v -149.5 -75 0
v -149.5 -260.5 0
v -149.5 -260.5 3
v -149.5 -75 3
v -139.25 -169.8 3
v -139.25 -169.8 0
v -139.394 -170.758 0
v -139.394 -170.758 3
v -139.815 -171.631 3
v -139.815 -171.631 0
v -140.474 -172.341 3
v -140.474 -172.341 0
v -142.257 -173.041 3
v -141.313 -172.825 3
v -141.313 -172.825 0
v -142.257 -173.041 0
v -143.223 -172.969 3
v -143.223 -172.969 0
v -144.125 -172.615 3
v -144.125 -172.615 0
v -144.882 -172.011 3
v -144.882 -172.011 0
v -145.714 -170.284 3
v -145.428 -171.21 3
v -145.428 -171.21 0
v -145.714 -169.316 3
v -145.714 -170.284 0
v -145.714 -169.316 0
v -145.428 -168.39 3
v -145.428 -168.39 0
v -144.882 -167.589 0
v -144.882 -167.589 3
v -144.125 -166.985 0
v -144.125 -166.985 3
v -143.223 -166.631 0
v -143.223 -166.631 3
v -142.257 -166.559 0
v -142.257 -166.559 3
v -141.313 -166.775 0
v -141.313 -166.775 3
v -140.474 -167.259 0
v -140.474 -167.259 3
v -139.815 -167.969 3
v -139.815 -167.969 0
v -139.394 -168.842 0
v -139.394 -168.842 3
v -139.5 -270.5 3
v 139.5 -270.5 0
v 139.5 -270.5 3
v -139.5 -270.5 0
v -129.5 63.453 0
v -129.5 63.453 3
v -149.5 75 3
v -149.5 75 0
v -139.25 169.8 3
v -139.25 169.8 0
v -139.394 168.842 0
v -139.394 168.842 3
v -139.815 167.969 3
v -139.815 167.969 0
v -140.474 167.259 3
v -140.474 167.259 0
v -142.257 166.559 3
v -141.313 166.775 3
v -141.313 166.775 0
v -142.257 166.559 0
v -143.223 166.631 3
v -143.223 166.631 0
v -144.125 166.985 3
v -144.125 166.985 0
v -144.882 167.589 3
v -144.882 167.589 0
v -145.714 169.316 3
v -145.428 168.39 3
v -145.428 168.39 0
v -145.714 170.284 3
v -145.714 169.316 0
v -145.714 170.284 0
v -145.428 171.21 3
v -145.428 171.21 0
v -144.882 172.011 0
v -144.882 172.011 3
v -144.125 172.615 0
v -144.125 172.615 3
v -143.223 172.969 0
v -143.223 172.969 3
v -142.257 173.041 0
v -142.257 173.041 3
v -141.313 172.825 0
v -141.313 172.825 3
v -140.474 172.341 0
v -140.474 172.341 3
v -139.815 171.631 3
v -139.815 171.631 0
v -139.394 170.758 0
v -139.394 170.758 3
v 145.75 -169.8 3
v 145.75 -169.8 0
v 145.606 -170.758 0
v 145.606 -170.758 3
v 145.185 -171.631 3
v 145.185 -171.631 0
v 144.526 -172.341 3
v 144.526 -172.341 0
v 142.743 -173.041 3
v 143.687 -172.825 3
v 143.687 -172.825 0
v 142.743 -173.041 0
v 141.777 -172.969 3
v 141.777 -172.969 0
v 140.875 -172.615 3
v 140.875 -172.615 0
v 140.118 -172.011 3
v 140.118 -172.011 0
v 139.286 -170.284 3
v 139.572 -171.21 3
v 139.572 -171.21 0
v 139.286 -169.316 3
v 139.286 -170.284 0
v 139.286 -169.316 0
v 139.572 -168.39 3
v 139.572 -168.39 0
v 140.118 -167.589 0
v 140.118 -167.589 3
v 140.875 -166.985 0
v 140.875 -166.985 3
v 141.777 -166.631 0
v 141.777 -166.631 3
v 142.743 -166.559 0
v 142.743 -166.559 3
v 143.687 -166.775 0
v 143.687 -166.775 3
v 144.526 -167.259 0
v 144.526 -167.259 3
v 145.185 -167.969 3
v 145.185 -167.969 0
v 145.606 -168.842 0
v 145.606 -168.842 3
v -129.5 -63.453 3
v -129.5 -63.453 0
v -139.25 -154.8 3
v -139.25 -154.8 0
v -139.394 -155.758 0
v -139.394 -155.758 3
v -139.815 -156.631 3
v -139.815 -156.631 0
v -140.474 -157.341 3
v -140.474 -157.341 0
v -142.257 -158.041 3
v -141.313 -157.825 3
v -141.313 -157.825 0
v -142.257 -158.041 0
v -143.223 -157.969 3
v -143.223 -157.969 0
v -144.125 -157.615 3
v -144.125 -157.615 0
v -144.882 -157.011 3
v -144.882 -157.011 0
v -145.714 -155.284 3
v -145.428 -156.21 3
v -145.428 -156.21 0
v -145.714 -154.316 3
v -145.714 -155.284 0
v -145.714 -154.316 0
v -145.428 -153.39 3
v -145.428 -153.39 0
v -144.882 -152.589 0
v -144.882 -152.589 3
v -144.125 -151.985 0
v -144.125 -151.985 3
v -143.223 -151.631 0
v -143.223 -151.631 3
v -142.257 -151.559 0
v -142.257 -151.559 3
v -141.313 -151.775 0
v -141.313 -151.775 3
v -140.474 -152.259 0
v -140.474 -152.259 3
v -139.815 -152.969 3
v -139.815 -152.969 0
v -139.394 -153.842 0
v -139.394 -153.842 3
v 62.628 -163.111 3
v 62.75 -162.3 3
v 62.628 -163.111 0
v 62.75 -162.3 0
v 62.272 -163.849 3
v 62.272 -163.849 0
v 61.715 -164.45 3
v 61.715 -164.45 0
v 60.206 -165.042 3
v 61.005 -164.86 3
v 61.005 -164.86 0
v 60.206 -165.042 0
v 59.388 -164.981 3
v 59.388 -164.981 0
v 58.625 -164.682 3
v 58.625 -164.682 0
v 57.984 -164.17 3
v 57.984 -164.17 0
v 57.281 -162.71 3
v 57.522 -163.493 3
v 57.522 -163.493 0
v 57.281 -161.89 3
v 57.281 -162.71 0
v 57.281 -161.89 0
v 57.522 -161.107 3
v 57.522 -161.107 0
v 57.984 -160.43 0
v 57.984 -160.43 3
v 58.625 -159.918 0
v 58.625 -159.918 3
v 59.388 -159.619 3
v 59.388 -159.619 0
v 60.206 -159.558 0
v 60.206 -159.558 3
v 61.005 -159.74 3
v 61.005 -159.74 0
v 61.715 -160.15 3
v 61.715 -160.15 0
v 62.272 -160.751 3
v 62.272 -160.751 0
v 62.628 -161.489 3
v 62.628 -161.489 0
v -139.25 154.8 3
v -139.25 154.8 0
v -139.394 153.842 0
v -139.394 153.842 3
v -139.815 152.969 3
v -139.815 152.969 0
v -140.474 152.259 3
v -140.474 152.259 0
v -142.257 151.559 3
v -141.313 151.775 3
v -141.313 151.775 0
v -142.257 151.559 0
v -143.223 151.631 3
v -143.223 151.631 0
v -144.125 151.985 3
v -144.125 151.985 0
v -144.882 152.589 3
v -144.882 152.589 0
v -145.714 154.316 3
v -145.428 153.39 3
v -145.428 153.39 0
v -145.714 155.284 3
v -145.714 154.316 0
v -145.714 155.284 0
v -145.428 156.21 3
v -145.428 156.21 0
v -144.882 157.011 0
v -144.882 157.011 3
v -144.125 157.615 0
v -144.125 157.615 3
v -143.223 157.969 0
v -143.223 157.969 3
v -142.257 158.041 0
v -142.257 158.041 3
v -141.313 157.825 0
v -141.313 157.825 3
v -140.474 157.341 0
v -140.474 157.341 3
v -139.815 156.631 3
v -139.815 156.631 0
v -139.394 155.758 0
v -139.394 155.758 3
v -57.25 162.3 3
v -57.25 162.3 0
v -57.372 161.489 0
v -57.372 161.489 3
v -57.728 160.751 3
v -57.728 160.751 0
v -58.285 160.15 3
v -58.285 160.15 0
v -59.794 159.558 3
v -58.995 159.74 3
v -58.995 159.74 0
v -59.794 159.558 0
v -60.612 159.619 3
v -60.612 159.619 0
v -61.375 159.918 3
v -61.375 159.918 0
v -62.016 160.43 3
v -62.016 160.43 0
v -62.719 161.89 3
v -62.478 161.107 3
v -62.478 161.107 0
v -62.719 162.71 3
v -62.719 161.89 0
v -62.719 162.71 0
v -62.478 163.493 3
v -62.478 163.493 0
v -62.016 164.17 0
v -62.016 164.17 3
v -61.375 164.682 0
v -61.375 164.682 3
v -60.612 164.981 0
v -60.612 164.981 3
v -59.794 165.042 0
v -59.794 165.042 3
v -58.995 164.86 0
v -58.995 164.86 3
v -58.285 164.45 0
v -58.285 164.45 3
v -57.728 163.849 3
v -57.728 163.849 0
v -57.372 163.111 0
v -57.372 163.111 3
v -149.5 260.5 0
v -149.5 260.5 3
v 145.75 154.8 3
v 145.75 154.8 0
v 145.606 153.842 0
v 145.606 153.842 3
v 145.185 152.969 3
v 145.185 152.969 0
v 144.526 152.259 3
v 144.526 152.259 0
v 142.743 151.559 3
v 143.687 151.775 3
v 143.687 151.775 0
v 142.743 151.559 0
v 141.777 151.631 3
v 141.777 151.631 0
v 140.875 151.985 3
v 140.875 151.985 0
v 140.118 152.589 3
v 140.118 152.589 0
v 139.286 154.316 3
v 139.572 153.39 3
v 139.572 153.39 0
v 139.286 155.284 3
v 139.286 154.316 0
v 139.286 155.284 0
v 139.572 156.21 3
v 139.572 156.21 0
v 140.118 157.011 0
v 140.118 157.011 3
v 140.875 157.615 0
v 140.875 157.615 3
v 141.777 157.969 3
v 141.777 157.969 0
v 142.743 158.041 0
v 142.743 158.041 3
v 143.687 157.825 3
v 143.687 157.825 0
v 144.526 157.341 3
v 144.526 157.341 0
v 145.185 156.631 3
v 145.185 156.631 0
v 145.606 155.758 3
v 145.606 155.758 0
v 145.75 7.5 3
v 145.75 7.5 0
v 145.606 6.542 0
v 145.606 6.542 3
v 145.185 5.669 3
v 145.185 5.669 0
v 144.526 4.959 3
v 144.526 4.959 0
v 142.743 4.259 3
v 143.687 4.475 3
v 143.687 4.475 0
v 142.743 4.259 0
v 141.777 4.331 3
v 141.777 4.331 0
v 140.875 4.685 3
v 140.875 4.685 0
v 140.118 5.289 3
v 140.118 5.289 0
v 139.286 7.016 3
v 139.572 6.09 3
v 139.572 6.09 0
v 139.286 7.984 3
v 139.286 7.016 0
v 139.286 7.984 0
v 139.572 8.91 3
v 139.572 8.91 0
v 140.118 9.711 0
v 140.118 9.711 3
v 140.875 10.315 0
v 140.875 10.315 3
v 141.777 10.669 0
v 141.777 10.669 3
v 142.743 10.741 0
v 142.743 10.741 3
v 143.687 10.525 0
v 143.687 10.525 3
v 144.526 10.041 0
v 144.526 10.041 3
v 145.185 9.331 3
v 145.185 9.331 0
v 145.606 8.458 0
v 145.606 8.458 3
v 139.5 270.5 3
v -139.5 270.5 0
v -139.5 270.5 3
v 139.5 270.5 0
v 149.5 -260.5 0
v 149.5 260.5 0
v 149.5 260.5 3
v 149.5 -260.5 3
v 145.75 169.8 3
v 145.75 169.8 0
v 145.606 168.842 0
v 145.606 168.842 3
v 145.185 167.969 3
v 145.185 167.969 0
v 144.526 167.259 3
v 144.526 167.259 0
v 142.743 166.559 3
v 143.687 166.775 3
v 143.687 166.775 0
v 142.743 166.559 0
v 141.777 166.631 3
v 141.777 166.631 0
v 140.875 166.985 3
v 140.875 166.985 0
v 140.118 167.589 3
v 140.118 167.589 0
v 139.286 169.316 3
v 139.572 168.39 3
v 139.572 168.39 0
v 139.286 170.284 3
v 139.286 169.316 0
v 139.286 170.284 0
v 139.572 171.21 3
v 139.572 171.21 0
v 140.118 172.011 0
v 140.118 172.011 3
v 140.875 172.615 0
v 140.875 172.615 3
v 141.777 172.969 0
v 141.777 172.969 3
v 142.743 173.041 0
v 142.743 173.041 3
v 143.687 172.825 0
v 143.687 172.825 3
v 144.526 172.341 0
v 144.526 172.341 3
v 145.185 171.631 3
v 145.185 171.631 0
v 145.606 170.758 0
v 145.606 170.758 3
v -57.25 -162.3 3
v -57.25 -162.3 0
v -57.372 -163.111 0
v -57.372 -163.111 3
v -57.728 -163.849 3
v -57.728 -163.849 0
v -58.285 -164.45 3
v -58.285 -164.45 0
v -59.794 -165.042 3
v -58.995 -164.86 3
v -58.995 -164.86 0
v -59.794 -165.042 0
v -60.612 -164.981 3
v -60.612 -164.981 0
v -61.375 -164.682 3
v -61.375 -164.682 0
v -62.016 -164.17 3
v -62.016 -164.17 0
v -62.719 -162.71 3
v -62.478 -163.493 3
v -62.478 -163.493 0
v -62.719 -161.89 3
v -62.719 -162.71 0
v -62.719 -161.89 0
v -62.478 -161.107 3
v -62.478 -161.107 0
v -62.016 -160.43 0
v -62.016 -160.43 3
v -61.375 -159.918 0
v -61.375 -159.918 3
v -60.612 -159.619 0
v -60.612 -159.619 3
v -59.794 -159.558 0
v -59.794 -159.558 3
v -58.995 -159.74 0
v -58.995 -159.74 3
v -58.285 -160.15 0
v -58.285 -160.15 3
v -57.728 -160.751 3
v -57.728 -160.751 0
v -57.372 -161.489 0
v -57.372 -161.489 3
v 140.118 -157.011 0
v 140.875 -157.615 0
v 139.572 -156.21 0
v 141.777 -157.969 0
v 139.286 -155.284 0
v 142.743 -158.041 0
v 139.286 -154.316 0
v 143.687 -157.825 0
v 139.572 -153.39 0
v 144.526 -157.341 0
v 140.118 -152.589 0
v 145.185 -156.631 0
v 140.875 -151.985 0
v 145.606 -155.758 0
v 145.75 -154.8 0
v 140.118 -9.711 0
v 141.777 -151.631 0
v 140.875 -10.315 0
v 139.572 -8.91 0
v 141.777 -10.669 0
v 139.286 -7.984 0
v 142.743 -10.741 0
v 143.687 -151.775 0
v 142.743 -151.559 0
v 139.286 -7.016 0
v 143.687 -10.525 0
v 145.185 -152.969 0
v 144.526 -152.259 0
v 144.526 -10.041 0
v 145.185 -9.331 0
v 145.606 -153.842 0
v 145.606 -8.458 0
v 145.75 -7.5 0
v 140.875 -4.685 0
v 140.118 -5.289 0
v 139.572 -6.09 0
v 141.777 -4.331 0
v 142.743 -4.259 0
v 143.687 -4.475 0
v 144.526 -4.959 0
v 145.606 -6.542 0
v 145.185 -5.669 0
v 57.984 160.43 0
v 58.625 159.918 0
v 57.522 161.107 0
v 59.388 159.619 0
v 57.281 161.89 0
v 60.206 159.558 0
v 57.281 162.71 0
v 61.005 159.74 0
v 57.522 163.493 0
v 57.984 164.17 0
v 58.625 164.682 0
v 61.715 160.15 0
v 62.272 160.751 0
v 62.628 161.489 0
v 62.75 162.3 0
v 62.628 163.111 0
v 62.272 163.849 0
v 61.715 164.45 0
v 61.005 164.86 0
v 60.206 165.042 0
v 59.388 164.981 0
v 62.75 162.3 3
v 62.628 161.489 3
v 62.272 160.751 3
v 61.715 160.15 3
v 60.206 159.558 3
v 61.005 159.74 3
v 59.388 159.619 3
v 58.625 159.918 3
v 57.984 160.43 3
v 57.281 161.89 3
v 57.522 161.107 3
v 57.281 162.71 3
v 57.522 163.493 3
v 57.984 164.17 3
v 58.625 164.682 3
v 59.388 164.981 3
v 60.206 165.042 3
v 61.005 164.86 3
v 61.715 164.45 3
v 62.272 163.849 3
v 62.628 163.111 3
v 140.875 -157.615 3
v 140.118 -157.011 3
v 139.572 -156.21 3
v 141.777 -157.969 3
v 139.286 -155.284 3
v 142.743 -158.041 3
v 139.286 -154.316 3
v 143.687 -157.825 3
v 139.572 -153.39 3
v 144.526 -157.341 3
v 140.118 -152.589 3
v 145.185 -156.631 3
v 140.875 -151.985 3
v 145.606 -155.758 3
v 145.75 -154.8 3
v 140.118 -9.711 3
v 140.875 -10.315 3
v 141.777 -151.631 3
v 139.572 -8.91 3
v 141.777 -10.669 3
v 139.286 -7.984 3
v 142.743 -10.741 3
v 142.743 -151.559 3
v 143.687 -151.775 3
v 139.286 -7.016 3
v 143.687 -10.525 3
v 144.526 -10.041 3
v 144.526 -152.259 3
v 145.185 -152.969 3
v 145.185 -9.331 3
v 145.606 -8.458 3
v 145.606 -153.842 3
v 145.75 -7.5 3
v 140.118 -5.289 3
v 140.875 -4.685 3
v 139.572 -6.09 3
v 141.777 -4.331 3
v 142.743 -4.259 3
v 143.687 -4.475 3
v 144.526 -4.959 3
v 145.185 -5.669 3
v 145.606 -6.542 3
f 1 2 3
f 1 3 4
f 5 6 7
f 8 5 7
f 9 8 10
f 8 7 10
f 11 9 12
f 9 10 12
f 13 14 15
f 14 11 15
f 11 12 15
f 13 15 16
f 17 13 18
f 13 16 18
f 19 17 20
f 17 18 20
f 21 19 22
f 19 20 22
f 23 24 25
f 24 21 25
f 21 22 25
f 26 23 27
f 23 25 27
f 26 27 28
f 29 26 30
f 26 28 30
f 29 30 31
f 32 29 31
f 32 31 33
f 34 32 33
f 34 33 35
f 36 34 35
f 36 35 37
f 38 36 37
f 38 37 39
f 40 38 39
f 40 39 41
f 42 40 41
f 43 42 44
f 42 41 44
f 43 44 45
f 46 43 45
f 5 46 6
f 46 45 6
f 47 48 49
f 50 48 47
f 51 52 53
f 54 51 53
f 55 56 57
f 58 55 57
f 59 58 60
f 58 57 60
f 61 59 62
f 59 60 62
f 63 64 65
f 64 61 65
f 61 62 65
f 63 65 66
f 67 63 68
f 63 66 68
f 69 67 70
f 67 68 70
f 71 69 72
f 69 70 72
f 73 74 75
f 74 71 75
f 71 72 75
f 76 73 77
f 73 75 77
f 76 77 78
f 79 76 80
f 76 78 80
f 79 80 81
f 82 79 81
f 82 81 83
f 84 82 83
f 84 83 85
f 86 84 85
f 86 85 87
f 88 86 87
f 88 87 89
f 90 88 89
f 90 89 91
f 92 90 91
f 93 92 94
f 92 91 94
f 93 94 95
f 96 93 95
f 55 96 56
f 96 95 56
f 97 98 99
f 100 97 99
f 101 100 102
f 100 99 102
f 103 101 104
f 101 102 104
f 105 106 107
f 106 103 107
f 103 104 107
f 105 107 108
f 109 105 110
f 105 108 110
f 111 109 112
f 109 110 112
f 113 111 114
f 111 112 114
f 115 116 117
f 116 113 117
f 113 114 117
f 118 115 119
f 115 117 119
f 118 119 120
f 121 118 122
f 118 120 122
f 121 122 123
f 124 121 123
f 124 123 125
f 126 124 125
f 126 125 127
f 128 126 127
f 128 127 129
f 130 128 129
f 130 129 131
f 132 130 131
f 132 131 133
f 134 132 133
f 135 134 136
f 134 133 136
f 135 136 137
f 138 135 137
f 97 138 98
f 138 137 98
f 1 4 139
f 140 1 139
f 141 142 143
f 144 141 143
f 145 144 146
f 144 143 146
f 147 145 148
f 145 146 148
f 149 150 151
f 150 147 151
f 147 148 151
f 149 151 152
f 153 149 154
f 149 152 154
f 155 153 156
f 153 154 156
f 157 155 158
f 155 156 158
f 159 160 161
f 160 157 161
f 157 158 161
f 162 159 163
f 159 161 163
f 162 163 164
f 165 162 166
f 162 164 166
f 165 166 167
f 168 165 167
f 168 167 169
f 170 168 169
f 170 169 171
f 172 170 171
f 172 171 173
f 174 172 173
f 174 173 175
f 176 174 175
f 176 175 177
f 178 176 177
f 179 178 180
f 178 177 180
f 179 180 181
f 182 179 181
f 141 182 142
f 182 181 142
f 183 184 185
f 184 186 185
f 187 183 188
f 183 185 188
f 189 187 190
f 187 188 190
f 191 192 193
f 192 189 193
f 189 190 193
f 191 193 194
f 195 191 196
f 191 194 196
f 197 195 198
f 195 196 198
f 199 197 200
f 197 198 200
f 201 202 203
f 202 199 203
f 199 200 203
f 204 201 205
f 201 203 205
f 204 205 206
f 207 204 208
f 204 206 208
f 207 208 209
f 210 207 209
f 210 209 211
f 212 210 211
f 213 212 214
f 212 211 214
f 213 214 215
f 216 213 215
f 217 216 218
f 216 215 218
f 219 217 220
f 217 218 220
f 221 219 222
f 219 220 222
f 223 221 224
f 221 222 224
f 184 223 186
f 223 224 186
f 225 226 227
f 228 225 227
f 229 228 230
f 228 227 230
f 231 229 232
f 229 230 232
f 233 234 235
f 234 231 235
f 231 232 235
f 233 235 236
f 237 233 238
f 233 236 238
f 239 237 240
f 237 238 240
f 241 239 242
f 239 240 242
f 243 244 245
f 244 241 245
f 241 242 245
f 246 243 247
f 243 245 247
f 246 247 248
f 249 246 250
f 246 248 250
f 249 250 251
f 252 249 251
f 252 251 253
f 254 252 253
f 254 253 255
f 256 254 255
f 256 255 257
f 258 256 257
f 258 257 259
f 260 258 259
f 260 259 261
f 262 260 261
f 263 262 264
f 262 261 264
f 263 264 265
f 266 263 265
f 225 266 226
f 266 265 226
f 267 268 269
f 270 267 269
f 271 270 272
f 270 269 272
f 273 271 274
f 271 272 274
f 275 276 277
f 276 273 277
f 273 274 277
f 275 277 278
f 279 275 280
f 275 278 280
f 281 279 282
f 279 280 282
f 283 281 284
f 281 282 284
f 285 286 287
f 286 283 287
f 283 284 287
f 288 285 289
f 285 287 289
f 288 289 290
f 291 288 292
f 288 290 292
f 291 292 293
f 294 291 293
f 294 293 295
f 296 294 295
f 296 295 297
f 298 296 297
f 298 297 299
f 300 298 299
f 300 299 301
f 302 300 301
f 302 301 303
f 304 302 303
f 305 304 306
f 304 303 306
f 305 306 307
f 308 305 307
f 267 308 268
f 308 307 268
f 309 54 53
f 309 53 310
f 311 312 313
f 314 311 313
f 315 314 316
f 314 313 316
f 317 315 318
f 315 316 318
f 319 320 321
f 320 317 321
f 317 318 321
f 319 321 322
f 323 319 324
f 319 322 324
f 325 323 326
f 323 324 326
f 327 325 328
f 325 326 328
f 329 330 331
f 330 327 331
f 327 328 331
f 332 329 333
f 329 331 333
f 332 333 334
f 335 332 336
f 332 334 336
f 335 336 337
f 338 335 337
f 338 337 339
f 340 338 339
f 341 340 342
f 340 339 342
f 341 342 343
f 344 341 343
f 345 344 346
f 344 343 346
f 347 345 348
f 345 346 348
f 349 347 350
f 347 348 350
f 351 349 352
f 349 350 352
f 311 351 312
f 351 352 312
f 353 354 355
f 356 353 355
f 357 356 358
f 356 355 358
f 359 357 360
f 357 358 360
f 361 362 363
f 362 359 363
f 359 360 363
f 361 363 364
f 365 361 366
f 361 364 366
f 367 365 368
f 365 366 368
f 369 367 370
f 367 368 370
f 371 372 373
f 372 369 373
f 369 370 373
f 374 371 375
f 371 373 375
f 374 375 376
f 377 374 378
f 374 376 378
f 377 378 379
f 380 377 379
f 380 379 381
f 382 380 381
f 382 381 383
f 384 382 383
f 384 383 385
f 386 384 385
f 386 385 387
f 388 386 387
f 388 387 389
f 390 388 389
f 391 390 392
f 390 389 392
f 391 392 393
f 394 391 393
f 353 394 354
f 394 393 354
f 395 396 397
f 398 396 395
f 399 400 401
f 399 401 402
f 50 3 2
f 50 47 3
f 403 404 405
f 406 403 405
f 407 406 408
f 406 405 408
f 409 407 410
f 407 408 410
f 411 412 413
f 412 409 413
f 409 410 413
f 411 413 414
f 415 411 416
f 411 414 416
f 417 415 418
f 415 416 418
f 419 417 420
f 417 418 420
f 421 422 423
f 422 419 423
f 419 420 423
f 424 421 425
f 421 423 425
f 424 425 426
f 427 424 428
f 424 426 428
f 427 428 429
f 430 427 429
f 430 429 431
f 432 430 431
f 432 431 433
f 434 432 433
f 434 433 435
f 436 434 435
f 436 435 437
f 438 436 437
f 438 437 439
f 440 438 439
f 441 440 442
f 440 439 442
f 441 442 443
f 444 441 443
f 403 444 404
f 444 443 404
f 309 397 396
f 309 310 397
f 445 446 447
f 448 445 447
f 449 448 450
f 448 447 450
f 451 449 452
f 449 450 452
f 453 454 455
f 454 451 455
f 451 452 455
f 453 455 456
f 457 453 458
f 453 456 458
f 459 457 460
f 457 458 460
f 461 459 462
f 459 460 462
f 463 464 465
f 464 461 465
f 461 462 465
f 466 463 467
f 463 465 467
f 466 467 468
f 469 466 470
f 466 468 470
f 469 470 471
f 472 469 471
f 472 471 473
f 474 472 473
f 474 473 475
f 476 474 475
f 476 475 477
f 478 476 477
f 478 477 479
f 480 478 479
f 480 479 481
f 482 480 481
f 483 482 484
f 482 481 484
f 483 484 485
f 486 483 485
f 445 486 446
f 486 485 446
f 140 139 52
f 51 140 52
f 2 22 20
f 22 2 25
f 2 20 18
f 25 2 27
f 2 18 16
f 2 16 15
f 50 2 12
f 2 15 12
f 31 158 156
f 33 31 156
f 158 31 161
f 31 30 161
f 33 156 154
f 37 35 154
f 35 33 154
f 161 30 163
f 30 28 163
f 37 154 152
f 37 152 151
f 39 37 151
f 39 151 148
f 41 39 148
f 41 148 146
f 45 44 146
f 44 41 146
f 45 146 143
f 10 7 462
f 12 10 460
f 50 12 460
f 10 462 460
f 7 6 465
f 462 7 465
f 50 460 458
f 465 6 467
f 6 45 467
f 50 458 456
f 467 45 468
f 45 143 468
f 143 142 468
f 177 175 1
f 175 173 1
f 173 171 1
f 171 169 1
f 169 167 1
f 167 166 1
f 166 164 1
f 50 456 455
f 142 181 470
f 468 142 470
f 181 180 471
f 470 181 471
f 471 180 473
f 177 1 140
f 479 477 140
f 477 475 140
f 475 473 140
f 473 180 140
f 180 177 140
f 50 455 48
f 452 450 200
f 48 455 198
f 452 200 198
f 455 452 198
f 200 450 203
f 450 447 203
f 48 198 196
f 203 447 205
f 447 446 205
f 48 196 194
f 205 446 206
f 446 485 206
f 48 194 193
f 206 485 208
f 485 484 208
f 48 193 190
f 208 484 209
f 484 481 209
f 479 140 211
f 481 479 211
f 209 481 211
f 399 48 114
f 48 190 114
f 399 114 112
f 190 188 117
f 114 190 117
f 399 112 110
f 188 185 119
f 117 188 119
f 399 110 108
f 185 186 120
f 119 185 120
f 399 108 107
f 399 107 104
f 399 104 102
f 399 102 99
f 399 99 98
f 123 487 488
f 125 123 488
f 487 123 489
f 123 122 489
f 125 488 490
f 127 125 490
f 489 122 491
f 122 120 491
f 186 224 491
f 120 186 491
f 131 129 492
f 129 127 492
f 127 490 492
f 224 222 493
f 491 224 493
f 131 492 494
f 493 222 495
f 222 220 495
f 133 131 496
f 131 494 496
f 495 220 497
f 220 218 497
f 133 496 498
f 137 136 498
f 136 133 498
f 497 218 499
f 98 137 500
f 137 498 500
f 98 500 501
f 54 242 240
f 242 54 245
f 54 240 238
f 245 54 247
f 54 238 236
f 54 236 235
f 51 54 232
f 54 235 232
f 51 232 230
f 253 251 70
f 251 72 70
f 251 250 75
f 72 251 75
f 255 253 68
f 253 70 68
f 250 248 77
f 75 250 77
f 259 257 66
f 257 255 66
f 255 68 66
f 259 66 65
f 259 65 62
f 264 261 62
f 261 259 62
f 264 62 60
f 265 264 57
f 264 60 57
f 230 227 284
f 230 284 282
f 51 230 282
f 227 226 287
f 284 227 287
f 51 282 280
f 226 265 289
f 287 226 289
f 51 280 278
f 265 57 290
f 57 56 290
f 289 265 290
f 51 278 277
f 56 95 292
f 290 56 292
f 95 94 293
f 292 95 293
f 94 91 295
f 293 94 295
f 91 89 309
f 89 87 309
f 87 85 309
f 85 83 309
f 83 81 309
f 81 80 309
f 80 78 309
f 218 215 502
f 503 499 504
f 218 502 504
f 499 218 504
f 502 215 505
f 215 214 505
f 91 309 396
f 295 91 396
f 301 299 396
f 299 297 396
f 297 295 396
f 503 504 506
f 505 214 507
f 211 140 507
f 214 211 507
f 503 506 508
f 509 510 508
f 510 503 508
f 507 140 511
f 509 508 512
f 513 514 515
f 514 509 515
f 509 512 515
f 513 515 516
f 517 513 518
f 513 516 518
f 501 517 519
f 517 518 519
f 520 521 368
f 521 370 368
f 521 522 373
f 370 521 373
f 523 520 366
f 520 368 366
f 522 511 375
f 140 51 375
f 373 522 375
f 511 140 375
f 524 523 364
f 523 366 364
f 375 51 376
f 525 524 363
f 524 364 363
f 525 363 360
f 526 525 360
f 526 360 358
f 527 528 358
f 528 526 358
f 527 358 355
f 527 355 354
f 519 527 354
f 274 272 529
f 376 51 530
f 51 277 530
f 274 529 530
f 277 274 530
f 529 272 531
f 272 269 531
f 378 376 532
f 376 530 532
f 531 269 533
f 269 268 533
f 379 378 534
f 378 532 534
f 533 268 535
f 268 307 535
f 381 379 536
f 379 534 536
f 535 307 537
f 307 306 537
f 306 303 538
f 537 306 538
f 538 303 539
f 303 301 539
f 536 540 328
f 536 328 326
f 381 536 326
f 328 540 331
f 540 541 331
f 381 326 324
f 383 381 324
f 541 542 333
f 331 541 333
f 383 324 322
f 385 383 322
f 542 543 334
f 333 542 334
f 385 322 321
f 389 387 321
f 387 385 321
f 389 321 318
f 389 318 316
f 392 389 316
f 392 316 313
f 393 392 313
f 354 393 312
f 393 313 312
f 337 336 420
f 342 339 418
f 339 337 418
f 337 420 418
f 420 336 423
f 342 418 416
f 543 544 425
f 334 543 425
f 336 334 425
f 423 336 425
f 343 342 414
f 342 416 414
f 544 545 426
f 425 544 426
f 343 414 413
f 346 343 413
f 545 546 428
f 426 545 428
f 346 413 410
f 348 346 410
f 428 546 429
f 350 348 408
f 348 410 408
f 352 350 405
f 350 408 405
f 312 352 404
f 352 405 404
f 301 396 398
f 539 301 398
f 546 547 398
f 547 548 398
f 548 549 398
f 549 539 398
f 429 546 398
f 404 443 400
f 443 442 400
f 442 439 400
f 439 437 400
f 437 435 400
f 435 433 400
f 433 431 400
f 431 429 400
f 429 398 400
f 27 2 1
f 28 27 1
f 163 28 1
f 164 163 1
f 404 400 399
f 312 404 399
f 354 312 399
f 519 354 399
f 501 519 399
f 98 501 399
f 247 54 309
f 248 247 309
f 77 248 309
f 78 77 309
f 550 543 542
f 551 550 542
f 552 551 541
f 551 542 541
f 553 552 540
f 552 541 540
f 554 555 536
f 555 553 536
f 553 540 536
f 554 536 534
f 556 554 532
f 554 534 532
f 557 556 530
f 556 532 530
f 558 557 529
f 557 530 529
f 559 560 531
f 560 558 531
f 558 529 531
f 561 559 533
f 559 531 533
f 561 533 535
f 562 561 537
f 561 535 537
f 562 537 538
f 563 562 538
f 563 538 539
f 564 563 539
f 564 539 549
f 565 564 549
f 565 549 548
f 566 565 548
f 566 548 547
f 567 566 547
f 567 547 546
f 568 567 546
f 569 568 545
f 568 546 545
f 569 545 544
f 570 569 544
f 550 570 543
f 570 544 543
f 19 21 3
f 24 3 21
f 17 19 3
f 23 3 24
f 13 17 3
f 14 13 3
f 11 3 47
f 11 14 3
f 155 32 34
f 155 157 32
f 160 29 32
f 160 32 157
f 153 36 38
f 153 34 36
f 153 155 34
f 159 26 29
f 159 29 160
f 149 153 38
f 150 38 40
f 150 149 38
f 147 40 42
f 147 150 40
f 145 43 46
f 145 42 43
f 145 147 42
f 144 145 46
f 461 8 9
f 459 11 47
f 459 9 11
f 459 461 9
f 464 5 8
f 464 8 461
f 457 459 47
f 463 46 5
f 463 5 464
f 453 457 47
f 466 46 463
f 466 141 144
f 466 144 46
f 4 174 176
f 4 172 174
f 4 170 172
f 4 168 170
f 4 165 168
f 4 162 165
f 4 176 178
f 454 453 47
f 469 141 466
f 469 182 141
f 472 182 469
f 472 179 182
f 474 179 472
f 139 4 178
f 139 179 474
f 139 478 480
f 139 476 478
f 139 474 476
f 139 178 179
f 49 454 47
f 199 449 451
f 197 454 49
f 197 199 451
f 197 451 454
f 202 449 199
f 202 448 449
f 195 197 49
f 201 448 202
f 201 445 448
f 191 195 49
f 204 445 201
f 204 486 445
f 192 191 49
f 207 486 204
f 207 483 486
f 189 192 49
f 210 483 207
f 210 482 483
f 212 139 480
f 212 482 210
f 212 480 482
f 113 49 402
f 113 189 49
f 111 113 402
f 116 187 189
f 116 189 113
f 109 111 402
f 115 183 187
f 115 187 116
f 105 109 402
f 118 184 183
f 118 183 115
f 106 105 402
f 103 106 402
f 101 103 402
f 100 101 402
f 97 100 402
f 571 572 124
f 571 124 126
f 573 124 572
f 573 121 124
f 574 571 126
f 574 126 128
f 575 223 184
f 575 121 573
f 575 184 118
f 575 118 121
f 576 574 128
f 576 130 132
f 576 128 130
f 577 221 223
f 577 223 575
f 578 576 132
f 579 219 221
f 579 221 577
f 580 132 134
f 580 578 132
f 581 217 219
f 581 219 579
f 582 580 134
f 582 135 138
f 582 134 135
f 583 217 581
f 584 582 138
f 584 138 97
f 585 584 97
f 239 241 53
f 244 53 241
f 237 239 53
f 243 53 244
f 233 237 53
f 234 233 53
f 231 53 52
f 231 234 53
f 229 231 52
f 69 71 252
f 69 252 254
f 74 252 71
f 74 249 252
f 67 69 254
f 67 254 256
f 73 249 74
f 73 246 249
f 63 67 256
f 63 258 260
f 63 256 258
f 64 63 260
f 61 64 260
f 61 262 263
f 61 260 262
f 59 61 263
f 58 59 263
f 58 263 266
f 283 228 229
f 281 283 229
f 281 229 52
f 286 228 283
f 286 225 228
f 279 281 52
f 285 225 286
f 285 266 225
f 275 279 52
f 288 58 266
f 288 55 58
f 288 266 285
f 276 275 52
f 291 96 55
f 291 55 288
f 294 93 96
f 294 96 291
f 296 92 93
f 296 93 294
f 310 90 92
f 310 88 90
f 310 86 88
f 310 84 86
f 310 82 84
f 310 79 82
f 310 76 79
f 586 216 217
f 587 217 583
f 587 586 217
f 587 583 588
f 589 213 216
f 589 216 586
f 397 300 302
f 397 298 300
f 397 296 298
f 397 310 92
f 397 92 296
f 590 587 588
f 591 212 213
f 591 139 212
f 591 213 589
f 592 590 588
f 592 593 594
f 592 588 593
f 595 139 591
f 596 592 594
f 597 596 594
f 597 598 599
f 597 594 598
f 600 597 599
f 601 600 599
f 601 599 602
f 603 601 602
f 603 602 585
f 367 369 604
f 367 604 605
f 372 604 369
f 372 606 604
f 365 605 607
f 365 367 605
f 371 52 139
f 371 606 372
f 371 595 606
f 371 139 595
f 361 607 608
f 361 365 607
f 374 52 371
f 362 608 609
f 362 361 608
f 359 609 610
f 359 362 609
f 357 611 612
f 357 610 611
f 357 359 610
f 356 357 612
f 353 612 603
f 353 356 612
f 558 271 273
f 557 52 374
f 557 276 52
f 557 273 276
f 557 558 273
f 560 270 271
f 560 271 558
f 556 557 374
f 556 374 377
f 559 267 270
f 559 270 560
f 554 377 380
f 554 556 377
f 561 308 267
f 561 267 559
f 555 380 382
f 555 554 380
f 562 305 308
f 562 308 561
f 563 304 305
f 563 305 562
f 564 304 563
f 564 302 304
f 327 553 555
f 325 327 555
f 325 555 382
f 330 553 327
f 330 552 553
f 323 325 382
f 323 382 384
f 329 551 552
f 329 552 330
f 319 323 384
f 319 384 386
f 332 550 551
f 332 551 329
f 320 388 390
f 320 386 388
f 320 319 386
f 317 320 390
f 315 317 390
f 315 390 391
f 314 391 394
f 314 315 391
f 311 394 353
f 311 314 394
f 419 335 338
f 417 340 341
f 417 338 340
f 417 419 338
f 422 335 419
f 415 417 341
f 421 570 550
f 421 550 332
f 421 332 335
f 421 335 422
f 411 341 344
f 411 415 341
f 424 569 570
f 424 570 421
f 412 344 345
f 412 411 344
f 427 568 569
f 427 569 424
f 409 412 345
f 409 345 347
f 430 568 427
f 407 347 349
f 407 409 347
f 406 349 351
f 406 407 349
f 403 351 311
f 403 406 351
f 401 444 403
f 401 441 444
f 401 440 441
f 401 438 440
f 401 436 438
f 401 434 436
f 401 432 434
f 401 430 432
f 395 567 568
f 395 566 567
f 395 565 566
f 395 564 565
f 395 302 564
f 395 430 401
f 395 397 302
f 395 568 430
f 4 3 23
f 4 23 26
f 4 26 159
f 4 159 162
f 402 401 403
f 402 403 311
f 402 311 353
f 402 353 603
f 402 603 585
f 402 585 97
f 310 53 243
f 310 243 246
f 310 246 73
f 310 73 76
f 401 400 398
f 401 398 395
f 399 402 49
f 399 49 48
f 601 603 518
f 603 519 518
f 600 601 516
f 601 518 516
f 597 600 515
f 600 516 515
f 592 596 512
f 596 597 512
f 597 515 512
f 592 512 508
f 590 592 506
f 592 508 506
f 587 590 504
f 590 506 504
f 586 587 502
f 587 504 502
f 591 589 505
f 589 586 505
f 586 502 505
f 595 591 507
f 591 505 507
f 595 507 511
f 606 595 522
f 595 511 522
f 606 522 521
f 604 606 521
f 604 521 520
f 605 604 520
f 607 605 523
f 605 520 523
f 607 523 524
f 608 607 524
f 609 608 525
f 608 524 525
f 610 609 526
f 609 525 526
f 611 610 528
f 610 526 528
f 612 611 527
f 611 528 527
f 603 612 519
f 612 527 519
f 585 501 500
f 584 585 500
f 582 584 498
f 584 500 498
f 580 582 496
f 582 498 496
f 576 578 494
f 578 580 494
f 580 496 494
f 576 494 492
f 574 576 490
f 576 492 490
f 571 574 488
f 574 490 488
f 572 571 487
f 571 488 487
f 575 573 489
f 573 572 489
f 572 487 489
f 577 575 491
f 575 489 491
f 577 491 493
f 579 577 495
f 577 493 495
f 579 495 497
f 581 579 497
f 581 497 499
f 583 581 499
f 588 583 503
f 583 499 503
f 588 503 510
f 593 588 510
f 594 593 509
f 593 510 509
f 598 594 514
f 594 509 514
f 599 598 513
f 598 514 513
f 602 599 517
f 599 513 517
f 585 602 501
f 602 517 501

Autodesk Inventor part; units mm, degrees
ref_plane "YZ Plane" through (0, 0, 0) normal (1, 0, 0) x (0, 1, 0)
ref_plane "XZ Plane" through (0, 0, 0) normal (0, 1, 0) x (-1, 0, 0)
sketch "Skizze1" plane through (0, 0, 0) normal (0, 0, 1) x (1, 0, 0)
  line L0 (-149.5, 270.5) -> (149.5, 270.5)
  line L1 (149.5, 270.5) -> (149.5, -270.5)
  line L2 (149.5, -270.5) -> (-149.5, -270.5)
  line L3 (-149.5, -270.5) -> (-149.5, 270.5)
  line L4 (-149.5, 270.5) -> (149.5, -270.5) construction
  line L5 (149.5, 270.5) -> (-149.5, -270.5) construction
  line L6 (-74.75, 270.5) -> (-74.75, -270.5) construction
  line L7 (0, 396.7) -> (0, -381.7) construction
  line L8 (-142.5, 270.5) -> (-142.5, -270.5) construction
  line L9 (-149.5, -162.3) -> (149.5, -162.3) construction
  circle A0 centre (-142.5, -154.8) radius 3.25
  circle A1 centre (-142.5, -169.8) radius 3.25
  line L10 (-222.3, 0) -> (287.3, 0) construction
  circle A2 centre (-142.5, 7.5) radius 3.25
  circle A3 centre (-142.5, -7.5) radius 3.25
  circle A4 centre (-142.5, 154.8) radius 3.25
  circle A5 centre (-142.5, 169.8) radius 3.25
  circle A6 centre (142.5, -154.8) radius 3.25
  circle A7 centre (142.5, -169.8) radius 3.25
  circle A8 centre (142.5, 7.5) radius 3.25
  circle A9 centre (142.5, -7.5) radius 3.25
  circle A10 centre (142.5, 169.8) radius 3.25
  circle A11 centre (142.5, 154.8) radius 3.25
  circle A12 centre (-60, -162.3) radius 2.75
  circle A13 centre (60, -162.3) radius 2.75
  circle A14 centre (-60, 162.3) radius 2.75
  circle A15 centre (60, 162.3) radius 2.75
  line L11 (214.5, 285.5) -> (84.5, 285.5) construction
  line L12 (84.5, 285.5) -> (84.5, 255.5)
  line L13 (84.5, 255.5) -> (214.5, 255.5)
  line L14 (214.5, 255.5) -> (214.5, 285.5) construction
  line L15 (214.5, 285.5) -> (84.5, 255.5) construction
  line L16 (84.5, 285.5) -> (214.5, 255.5) construction
  point P0 (0, 0)
  dimension "d0" = 541
  dimension "d1" = 299
  dimension "d2" = 74.75
  dimension "d3" = 7
  dimension "d4" = 108.2
  dimension "d5" = 6.5
  dimension "d6" = 7.5
  dimension "d7" = 6.5
  dimension "d8" = 7.5
  dimension "d9" = 7.5
  dimension "d10" = 6.5
  dimension "d11" = 5.5
  dimension "d12" = 60
  dimension "d15" = 130
  dimension "d16" = 15
extrude "Extrusion1" add sketch "Skizze1" along normal blind 3
chamfer "Fase1" distance 10 angle 45 4 edges at (149.5, 270.5, 1.5) (149.5, -270.5, 1.5) (-149.5, -270.5, 1.5) (-149.5, 270.5, 1.5)
ref_plane "HF-Kabel-DurchlassPunkt" through (-139.5, -56.5, 0) normal (0, -1, 0) x (1, 0, 0)
sketch "S-AussparungHFKabel" plane through (0, 0, 3) normal (0, 0, 1) x (1, 0, 0)
  line L0 (209.3, -56.5) -> (-209.3, -56.5) construction
  line L1 (-149.5, 260.5) -> (-149.5, -260.5) projected
  line L2 (-149.5, -75) -> (-129.5, -63.453)
  line L3 (-129.5, -63.453) -> (-129.5, 63.453)
  line L4 (-129.5, 63.453) -> (-149.5, 75)
  line L5 (-129.5, 0) -> (-149.5, 0) construction
  line L6 (-215.9, 0) -> (210.4, 0) construction
  point P0 (0, 0)
  dimension "d21" = 60
  dimension "d22" = 20
  dimension "d23" = 150
extrude "Ex-Kabelaussparung" cut sketch "S-AussparungHFKabel" against normal blind 10
equation "\"d2\" = 0.25 * d1"
equation "\"d4\" = 0.2 * d0"
equation "\"d7\" = d5"
equation "\"d8\" = d6"
equation "\"d9\" = d6"
equation "\"d10\" = d5"
properties part number "enc-BackPanel Unten HF-Durchlass"
